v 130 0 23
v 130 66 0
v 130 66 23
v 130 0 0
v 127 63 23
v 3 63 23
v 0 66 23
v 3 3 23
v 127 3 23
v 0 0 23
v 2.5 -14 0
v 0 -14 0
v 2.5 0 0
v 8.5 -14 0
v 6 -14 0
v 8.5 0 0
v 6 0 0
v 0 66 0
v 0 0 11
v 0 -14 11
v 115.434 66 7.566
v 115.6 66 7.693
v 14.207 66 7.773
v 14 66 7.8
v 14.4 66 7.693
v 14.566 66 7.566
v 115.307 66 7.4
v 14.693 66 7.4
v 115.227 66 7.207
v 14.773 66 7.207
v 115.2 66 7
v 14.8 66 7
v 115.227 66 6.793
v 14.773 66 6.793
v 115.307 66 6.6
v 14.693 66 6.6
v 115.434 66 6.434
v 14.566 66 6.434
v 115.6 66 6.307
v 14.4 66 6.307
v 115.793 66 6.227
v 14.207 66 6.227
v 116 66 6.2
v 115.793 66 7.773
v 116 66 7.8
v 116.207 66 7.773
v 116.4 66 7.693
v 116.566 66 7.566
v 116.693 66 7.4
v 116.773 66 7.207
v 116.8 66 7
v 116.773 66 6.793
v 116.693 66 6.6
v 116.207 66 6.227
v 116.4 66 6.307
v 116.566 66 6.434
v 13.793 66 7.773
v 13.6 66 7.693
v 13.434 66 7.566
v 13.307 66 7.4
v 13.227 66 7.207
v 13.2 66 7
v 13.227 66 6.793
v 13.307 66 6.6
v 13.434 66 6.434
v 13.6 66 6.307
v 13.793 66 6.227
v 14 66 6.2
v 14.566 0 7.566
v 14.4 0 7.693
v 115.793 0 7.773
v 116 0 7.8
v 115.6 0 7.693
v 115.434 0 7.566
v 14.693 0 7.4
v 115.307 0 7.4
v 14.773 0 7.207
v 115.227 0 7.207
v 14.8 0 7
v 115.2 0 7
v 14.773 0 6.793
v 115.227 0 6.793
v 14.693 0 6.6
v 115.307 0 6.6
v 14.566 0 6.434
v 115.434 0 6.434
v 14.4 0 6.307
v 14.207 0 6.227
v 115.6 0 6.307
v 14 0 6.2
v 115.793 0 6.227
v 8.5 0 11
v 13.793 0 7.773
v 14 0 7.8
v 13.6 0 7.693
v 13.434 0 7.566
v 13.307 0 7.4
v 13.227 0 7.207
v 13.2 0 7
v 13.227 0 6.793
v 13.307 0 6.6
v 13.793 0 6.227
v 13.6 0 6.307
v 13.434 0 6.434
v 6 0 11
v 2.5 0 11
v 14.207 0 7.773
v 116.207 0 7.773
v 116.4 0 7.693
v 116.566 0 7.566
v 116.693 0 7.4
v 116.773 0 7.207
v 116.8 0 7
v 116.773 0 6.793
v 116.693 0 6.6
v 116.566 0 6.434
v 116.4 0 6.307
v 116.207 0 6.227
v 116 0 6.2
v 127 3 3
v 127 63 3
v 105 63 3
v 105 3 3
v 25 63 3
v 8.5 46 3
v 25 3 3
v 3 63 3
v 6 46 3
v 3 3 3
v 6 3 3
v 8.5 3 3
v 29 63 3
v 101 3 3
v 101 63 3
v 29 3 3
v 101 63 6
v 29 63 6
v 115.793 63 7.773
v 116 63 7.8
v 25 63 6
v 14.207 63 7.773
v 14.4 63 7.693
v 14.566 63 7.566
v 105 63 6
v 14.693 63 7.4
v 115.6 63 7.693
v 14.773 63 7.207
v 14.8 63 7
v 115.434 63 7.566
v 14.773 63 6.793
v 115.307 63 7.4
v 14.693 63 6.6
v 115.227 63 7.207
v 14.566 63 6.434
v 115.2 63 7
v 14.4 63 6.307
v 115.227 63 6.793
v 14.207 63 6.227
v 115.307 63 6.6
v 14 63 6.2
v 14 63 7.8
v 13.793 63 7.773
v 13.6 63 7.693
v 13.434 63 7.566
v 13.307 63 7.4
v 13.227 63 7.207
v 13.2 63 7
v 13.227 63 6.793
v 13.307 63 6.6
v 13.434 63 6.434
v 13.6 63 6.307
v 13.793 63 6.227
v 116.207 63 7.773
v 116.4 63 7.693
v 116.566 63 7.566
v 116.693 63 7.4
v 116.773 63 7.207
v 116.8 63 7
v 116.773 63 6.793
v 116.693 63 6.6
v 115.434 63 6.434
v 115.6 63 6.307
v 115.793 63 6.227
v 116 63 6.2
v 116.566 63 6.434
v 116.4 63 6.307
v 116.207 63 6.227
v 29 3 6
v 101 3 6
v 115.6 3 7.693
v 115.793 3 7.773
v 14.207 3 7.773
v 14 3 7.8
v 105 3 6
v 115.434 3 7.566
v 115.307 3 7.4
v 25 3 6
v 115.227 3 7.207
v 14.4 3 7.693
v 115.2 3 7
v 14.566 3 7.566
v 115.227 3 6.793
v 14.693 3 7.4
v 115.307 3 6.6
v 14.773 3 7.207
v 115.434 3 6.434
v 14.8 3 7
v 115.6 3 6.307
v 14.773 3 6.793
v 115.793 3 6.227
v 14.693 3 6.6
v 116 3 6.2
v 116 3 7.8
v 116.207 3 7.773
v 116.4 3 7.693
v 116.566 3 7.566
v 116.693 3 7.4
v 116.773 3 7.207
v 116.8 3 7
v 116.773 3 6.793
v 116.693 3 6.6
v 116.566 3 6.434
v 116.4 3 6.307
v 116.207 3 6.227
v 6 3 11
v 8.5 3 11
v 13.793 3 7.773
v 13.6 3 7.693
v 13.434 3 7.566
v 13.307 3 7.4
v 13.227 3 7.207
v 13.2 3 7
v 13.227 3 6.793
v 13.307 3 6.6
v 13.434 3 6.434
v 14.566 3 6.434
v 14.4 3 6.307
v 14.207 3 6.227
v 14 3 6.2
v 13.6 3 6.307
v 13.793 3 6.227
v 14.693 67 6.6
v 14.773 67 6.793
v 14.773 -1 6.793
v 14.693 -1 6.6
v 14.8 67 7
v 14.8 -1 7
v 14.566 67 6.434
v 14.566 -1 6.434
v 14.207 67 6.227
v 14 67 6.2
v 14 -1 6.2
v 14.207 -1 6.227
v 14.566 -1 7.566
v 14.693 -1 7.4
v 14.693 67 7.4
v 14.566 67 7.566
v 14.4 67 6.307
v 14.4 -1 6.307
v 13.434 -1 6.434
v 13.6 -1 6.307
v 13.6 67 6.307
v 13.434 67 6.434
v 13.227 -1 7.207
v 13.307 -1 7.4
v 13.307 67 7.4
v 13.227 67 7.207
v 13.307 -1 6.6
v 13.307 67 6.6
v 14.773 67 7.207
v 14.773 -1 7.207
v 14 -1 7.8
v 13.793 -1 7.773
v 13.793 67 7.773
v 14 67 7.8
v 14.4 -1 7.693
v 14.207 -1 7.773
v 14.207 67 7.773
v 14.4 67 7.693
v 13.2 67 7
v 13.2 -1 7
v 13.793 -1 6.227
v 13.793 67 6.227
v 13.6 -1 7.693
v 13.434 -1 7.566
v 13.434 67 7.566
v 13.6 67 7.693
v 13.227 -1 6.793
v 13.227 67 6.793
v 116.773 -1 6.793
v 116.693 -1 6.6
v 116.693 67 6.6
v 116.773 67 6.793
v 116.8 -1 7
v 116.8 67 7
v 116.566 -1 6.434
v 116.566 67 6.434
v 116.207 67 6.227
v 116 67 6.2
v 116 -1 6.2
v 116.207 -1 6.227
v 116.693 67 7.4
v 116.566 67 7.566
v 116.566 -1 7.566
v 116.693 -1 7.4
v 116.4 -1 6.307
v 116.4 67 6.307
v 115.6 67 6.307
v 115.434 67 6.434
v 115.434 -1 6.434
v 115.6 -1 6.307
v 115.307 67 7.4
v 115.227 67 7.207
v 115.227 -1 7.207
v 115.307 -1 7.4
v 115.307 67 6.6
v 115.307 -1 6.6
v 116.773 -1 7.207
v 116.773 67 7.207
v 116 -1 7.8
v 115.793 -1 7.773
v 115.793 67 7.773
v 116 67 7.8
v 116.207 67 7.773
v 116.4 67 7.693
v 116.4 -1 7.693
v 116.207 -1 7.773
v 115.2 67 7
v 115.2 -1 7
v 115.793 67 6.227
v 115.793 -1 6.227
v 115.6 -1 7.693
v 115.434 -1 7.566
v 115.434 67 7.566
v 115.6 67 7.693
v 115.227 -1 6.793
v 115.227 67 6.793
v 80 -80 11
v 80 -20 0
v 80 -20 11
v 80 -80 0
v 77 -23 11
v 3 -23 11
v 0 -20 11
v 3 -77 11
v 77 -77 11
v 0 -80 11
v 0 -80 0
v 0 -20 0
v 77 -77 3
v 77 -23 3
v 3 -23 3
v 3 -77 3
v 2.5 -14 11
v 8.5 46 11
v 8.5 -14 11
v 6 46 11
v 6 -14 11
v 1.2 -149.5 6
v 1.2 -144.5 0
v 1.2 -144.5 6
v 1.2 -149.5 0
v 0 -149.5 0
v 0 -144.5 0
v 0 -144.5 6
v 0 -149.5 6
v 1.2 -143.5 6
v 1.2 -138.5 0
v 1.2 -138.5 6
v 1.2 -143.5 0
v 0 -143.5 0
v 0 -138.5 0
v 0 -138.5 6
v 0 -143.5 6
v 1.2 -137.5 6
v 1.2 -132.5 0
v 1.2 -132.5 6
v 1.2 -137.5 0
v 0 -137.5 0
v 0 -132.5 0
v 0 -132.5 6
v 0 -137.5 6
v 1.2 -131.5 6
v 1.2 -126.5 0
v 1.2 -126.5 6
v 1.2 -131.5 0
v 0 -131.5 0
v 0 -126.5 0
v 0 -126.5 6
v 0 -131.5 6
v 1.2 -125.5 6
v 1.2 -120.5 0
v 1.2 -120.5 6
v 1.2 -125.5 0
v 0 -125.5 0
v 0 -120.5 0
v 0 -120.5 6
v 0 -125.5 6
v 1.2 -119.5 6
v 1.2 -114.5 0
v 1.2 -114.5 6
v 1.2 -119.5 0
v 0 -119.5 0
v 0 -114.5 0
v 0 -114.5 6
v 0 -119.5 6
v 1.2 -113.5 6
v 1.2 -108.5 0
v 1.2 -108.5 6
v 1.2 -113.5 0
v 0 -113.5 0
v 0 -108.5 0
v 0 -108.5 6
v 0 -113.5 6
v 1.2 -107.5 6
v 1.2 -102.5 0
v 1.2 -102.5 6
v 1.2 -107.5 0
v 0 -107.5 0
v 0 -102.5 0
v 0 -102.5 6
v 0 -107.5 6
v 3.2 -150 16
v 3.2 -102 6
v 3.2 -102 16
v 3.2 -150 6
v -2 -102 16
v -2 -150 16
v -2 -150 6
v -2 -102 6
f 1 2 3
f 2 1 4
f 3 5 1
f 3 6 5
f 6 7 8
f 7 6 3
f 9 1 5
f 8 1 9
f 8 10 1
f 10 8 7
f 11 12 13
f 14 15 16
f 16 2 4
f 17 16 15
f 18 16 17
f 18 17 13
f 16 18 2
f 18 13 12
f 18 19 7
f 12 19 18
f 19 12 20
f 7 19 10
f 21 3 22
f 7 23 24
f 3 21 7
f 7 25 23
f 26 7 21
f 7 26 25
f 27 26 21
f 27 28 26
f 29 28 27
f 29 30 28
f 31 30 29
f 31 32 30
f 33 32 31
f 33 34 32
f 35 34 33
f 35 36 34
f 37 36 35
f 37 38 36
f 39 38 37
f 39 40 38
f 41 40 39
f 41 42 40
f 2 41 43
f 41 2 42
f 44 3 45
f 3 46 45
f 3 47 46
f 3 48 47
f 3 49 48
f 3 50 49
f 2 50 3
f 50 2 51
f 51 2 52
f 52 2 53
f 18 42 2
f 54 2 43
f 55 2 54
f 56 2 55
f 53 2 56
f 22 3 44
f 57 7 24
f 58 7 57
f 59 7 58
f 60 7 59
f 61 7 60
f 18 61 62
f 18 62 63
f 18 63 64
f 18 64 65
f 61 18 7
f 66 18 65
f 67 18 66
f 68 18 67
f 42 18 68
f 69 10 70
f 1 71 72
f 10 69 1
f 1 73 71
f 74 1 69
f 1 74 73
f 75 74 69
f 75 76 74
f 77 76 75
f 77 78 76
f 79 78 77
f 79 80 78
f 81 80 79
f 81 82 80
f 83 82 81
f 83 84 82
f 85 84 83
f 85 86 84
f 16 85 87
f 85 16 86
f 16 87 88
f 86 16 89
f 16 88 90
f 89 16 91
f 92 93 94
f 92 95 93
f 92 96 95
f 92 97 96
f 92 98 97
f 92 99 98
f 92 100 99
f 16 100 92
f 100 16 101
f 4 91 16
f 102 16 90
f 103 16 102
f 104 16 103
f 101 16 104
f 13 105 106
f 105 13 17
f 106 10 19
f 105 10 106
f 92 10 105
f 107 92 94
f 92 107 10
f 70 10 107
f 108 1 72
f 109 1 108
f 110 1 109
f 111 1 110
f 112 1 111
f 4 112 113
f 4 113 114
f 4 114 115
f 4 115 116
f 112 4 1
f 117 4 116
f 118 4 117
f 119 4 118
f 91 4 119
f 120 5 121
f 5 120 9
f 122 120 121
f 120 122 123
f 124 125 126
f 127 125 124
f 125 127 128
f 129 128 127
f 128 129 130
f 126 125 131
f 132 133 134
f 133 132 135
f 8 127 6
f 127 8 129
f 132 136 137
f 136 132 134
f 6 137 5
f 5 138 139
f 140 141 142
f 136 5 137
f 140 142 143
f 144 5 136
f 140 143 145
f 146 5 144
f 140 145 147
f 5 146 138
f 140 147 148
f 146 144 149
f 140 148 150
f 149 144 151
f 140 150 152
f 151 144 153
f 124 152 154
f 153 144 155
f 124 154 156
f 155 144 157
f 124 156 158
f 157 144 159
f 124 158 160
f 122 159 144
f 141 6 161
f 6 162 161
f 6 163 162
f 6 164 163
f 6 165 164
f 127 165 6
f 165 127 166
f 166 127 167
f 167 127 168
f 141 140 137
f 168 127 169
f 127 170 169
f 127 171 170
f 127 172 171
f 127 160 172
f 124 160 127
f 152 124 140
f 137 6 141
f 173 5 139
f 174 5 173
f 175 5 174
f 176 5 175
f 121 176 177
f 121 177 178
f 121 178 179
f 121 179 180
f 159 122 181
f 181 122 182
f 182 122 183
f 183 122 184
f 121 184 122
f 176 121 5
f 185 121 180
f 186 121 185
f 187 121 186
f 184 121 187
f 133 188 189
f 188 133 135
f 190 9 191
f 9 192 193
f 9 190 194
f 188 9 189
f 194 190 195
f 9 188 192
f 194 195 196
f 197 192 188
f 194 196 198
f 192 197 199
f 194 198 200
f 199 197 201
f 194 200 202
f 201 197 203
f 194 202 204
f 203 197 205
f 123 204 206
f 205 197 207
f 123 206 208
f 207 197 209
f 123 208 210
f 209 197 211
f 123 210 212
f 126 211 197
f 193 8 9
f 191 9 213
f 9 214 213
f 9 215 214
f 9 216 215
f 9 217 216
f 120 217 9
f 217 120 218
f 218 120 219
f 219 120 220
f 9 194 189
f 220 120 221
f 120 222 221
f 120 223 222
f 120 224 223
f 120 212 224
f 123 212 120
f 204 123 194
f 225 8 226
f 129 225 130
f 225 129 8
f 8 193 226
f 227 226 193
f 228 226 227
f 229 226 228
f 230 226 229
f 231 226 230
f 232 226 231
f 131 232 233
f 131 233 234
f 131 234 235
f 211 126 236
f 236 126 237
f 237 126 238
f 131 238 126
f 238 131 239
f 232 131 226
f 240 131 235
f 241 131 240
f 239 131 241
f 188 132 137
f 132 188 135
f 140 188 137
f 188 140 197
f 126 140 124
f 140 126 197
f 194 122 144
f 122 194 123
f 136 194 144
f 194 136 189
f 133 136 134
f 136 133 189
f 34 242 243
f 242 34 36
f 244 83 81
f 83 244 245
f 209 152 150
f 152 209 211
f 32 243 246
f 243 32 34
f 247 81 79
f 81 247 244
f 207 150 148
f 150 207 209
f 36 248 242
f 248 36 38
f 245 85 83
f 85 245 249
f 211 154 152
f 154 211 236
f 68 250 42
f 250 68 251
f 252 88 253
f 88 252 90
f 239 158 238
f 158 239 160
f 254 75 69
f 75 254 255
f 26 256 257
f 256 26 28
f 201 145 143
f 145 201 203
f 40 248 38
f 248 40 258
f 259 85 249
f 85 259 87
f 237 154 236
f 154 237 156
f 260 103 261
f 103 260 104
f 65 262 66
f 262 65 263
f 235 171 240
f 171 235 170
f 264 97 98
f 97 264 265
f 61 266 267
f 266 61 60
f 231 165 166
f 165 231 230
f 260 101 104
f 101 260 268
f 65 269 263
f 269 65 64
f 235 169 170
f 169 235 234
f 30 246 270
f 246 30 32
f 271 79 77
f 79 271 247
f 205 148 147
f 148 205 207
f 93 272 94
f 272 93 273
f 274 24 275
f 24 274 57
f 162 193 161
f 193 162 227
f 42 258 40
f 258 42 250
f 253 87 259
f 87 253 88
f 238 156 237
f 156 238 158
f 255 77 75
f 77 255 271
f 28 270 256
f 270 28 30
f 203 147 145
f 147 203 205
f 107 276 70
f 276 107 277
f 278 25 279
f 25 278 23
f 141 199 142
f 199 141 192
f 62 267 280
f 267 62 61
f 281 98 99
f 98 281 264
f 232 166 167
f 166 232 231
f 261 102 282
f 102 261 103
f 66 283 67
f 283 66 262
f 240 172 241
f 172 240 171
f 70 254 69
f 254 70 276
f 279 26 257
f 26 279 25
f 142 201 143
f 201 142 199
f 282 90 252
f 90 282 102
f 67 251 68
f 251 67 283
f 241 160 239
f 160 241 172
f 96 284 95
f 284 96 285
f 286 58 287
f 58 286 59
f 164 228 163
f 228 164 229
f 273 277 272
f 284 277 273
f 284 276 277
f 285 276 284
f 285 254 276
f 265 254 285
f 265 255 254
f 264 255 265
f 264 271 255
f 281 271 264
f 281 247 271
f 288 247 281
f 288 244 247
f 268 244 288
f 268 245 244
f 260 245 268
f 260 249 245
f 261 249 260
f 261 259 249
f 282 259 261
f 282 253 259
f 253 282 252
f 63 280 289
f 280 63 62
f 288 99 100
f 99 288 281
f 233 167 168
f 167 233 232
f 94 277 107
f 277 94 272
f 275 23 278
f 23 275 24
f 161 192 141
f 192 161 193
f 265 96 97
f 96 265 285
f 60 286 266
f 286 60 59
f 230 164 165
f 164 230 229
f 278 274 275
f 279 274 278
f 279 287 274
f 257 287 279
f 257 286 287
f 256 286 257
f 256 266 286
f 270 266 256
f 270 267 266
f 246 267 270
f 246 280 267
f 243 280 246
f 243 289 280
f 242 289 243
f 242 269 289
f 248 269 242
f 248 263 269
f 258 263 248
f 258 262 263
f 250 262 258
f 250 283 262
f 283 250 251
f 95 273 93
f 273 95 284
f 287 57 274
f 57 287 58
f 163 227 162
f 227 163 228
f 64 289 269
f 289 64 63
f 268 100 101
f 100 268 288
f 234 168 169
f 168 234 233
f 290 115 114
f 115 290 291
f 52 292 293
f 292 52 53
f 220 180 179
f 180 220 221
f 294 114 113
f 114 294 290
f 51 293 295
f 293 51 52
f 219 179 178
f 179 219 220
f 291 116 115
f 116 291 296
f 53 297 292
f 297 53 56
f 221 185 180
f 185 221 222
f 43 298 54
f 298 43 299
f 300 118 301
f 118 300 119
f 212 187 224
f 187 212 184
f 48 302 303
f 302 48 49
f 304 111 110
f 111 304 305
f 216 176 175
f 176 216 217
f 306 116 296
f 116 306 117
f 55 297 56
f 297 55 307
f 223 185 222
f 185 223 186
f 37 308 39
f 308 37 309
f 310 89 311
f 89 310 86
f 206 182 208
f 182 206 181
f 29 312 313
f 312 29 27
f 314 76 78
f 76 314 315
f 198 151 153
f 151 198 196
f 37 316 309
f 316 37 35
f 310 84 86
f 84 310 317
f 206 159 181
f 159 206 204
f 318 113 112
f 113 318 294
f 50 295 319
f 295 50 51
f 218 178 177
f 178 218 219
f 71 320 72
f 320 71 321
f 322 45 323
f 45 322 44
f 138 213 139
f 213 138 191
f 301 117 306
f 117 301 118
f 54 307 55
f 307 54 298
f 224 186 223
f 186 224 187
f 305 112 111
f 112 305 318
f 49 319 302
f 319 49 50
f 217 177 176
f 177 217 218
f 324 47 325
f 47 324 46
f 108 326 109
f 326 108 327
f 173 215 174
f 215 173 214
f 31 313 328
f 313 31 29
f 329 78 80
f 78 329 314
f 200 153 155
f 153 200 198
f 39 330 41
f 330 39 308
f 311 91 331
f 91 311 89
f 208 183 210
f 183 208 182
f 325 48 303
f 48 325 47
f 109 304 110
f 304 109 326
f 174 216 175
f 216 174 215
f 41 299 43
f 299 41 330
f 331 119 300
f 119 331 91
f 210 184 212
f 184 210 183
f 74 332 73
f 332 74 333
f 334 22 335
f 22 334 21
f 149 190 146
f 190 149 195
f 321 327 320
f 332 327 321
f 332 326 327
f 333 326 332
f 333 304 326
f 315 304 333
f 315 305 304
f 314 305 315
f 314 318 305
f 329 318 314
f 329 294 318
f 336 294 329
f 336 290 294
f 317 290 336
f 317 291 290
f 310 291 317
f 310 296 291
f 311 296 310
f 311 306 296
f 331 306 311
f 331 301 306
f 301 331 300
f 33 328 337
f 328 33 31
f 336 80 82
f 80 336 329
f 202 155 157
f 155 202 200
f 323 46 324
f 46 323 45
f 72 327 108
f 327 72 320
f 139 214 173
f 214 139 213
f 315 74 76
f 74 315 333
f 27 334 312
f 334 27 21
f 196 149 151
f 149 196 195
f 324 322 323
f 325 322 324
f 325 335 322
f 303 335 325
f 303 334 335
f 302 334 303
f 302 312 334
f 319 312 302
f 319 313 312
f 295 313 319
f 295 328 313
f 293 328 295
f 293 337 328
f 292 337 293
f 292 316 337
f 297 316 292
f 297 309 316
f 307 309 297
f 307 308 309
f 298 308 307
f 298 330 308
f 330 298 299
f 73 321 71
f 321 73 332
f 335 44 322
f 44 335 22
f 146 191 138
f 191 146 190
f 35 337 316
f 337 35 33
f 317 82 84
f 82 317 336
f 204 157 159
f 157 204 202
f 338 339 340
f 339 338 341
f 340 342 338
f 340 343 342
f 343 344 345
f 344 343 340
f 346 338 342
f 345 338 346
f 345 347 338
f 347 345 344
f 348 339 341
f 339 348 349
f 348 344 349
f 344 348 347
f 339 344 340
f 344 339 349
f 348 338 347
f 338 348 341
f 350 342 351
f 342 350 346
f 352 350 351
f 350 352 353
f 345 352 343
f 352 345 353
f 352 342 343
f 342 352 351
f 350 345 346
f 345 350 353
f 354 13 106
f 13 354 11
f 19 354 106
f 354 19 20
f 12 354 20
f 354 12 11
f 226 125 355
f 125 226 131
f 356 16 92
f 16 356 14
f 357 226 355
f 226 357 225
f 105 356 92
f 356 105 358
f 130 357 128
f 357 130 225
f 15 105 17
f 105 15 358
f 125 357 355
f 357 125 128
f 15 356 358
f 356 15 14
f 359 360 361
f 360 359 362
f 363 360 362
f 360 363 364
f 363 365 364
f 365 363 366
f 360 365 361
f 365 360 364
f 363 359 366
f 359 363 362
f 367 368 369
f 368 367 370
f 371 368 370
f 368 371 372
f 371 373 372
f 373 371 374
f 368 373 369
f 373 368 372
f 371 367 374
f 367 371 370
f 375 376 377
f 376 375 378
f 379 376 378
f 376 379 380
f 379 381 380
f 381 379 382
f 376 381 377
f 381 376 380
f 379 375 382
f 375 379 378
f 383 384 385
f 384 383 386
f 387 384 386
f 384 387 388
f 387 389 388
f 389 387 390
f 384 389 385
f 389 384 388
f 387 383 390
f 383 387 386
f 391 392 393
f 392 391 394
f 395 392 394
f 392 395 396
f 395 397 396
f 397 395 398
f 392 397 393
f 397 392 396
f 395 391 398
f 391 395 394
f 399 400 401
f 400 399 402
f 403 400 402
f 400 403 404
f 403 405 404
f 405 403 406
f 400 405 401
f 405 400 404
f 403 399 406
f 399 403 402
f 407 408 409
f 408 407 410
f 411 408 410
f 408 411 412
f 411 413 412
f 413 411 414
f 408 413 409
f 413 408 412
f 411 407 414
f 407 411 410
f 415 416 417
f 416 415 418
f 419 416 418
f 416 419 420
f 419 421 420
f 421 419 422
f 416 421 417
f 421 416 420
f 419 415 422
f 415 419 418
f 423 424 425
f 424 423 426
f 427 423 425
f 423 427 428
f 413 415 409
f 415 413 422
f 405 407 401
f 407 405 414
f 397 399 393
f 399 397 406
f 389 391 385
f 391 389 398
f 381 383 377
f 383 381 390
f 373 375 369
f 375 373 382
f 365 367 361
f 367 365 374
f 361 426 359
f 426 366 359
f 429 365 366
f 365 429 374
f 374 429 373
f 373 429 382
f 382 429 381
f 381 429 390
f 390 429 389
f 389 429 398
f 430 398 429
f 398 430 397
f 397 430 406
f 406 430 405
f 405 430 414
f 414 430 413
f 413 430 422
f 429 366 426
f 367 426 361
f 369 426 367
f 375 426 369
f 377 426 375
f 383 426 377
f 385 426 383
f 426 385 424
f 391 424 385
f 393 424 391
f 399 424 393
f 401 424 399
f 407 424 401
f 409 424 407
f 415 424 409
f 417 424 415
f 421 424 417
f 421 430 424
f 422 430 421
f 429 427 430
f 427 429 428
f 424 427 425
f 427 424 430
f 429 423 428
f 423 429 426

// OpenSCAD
// Molecular Synth v0 - parametric DIY agarose gel-electrophoresis box
// ====================================================================
// Verify a fold: well-folded DNA origami runs as one tight band, distinct from
// the scaffold-only lane (Castro et al., Nat. Methods 2011; Stahl et al.,
// Angew. Chem. 2014). 3D-print this box (PLA/PETG), add stainless or platinum
// wire electrodes, run in 1x TAE + 12.5 mM MgCl2 at ~60-90 V on ice.
//
// Render the parts:  openscad -D part=\"buffer\" -o buffer.stl gel_box.scad
//                    part = \"buffer\" | \"tray\" | \"comb\" | \"all\"
//
// All dimensions in millimetres. Edit the parameters block to fit your gel size.

/* [Box] */
gel_len      = 80;    // casting tray inner length (run direction)
gel_wid      = 60;    // casting tray inner width
gel_thk      = 8;     // gel thickness
wall         = 3;     // wall thickness
buffer_extra = 22;    // electrode chamber length at each end
floor_thk    = 3;

/* [Comb] */
n_wells      = 8;
well_wid     = 5;
well_thk     = 1.2;   // tooth thickness -> well width in gel
comb_depth   = 6;     // how deep teeth dip into the gel
comb_handle  = 10;

/* [Electrodes] */
elec_d       = 1.6;   // wire / channel diameter (1.5 mm stainless TIG rod)
elec_z       = 4;     // height of electrode channel above floor

part = "all";

module buffer_chamber() {
    total_len = gel_len + 2*buffer_extra;
    total_wid = gel_wid + 2*wall;
    wall_h    = gel_thk + 12;
    difference() {
        // outer shell
        cube([total_len + 2*wall, total_wid, wall_h + floor_thk]);
        // inner cavity
        translate([wall, wall, floor_thk])
            cube([total_len, gel_wid, wall_h + 1]);
    }
    // casting-tray ledges (tray drops onto these, leaving electrode chambers open)
    for (x = [wall + buffer_extra, wall + buffer_extra + gel_len - 4])
        translate([x, wall, floor_thk])
            cube([4, gel_wid, 3]);
    // electrode channels (push wire through both side walls at each end)
    for (x = [wall + buffer_extra/2, wall + buffer_extra*1.5 + gel_len])
        translate([x, -1, floor_thk + elec_z])
            rotate([-90,0,0]) cylinder(h = total_wid + 2, d = elec_d, $fn=24);
}

module casting_tray() {
    difference() {
        cube([gel_len, gel_wid, gel_thk + floor_thk]);
        translate([wall, wall, floor_thk])
            cube([gel_len - 2*wall, gel_wid - 2*wall, gel_thk + 1]);
    }
    // open ends (dam removed before running) modelled as removable end caps
    // -> print two loose end dams:
    translate([0, gel_wid + 6, 0]) cube([2.5, gel_wid, gel_thk + floor_thk]);
    translate([6, gel_wid + 6, 0]) cube([2.5, gel_wid, gel_thk + floor_thk]);
}

module comb() {
    span = gel_wid - 2*wall - 6;
    pitch = span / n_wells;
    // handle bar
    translate([-2, 0, 0]) cube([well_thk + 4, span, comb_handle]);
    // teeth
    for (i = [0 : n_wells - 1])
        translate([0, i*pitch + (pitch - well_wid)/2, -comb_depth])
            cube([well_thk, well_wid, comb_depth + 1]);
}

if (part == "buffer" || part == "all") buffer_chamber();
if (part == "tray"   || part == "all") translate([0, -gel_wid - 20, 0]) casting_tray();
if (part == "comb"   || part == "all") translate([0, -gel_wid - 90, comb_depth]) comb();
